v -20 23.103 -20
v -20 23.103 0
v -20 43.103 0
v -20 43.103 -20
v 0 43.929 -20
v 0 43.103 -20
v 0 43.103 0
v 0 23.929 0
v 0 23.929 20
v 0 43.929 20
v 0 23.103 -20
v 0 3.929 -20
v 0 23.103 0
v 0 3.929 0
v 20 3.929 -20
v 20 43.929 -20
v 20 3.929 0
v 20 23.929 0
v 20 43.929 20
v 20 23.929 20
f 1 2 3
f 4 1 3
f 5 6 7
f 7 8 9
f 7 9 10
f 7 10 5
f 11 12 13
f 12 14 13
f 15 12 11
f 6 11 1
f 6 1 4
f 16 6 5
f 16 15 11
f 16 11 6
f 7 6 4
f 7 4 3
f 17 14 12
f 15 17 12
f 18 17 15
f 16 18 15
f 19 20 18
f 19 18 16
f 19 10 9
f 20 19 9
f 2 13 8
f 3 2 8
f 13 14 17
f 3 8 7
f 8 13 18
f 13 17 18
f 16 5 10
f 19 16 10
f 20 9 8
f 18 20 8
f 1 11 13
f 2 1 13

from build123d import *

# Parameters (mm, degrees)
F1_DEPTH = 20
F2_W     = 20
F2_H     = 20
F3_DEPTH = 20


with BuildPart() as f1:
    # F0 (on Right) → F1 (new body)
    with BuildSketch(Plane.YZ):
        Polygon((43.928572, -20), (43.928572, 20), (23.928572, 20), (23.928572, 0), (3.928572, 0), (3.928572, -20), align=None)
    extrude(amount=F1_DEPTH)

    # F2 (on Right) → F3 (join)
    with BuildSketch(Plane.YZ):
        with Locations((33.10277, -10)):
            Rectangle(F2_W, F2_H)
    extrude(amount=-F3_DEPTH)


solid = f1.part
